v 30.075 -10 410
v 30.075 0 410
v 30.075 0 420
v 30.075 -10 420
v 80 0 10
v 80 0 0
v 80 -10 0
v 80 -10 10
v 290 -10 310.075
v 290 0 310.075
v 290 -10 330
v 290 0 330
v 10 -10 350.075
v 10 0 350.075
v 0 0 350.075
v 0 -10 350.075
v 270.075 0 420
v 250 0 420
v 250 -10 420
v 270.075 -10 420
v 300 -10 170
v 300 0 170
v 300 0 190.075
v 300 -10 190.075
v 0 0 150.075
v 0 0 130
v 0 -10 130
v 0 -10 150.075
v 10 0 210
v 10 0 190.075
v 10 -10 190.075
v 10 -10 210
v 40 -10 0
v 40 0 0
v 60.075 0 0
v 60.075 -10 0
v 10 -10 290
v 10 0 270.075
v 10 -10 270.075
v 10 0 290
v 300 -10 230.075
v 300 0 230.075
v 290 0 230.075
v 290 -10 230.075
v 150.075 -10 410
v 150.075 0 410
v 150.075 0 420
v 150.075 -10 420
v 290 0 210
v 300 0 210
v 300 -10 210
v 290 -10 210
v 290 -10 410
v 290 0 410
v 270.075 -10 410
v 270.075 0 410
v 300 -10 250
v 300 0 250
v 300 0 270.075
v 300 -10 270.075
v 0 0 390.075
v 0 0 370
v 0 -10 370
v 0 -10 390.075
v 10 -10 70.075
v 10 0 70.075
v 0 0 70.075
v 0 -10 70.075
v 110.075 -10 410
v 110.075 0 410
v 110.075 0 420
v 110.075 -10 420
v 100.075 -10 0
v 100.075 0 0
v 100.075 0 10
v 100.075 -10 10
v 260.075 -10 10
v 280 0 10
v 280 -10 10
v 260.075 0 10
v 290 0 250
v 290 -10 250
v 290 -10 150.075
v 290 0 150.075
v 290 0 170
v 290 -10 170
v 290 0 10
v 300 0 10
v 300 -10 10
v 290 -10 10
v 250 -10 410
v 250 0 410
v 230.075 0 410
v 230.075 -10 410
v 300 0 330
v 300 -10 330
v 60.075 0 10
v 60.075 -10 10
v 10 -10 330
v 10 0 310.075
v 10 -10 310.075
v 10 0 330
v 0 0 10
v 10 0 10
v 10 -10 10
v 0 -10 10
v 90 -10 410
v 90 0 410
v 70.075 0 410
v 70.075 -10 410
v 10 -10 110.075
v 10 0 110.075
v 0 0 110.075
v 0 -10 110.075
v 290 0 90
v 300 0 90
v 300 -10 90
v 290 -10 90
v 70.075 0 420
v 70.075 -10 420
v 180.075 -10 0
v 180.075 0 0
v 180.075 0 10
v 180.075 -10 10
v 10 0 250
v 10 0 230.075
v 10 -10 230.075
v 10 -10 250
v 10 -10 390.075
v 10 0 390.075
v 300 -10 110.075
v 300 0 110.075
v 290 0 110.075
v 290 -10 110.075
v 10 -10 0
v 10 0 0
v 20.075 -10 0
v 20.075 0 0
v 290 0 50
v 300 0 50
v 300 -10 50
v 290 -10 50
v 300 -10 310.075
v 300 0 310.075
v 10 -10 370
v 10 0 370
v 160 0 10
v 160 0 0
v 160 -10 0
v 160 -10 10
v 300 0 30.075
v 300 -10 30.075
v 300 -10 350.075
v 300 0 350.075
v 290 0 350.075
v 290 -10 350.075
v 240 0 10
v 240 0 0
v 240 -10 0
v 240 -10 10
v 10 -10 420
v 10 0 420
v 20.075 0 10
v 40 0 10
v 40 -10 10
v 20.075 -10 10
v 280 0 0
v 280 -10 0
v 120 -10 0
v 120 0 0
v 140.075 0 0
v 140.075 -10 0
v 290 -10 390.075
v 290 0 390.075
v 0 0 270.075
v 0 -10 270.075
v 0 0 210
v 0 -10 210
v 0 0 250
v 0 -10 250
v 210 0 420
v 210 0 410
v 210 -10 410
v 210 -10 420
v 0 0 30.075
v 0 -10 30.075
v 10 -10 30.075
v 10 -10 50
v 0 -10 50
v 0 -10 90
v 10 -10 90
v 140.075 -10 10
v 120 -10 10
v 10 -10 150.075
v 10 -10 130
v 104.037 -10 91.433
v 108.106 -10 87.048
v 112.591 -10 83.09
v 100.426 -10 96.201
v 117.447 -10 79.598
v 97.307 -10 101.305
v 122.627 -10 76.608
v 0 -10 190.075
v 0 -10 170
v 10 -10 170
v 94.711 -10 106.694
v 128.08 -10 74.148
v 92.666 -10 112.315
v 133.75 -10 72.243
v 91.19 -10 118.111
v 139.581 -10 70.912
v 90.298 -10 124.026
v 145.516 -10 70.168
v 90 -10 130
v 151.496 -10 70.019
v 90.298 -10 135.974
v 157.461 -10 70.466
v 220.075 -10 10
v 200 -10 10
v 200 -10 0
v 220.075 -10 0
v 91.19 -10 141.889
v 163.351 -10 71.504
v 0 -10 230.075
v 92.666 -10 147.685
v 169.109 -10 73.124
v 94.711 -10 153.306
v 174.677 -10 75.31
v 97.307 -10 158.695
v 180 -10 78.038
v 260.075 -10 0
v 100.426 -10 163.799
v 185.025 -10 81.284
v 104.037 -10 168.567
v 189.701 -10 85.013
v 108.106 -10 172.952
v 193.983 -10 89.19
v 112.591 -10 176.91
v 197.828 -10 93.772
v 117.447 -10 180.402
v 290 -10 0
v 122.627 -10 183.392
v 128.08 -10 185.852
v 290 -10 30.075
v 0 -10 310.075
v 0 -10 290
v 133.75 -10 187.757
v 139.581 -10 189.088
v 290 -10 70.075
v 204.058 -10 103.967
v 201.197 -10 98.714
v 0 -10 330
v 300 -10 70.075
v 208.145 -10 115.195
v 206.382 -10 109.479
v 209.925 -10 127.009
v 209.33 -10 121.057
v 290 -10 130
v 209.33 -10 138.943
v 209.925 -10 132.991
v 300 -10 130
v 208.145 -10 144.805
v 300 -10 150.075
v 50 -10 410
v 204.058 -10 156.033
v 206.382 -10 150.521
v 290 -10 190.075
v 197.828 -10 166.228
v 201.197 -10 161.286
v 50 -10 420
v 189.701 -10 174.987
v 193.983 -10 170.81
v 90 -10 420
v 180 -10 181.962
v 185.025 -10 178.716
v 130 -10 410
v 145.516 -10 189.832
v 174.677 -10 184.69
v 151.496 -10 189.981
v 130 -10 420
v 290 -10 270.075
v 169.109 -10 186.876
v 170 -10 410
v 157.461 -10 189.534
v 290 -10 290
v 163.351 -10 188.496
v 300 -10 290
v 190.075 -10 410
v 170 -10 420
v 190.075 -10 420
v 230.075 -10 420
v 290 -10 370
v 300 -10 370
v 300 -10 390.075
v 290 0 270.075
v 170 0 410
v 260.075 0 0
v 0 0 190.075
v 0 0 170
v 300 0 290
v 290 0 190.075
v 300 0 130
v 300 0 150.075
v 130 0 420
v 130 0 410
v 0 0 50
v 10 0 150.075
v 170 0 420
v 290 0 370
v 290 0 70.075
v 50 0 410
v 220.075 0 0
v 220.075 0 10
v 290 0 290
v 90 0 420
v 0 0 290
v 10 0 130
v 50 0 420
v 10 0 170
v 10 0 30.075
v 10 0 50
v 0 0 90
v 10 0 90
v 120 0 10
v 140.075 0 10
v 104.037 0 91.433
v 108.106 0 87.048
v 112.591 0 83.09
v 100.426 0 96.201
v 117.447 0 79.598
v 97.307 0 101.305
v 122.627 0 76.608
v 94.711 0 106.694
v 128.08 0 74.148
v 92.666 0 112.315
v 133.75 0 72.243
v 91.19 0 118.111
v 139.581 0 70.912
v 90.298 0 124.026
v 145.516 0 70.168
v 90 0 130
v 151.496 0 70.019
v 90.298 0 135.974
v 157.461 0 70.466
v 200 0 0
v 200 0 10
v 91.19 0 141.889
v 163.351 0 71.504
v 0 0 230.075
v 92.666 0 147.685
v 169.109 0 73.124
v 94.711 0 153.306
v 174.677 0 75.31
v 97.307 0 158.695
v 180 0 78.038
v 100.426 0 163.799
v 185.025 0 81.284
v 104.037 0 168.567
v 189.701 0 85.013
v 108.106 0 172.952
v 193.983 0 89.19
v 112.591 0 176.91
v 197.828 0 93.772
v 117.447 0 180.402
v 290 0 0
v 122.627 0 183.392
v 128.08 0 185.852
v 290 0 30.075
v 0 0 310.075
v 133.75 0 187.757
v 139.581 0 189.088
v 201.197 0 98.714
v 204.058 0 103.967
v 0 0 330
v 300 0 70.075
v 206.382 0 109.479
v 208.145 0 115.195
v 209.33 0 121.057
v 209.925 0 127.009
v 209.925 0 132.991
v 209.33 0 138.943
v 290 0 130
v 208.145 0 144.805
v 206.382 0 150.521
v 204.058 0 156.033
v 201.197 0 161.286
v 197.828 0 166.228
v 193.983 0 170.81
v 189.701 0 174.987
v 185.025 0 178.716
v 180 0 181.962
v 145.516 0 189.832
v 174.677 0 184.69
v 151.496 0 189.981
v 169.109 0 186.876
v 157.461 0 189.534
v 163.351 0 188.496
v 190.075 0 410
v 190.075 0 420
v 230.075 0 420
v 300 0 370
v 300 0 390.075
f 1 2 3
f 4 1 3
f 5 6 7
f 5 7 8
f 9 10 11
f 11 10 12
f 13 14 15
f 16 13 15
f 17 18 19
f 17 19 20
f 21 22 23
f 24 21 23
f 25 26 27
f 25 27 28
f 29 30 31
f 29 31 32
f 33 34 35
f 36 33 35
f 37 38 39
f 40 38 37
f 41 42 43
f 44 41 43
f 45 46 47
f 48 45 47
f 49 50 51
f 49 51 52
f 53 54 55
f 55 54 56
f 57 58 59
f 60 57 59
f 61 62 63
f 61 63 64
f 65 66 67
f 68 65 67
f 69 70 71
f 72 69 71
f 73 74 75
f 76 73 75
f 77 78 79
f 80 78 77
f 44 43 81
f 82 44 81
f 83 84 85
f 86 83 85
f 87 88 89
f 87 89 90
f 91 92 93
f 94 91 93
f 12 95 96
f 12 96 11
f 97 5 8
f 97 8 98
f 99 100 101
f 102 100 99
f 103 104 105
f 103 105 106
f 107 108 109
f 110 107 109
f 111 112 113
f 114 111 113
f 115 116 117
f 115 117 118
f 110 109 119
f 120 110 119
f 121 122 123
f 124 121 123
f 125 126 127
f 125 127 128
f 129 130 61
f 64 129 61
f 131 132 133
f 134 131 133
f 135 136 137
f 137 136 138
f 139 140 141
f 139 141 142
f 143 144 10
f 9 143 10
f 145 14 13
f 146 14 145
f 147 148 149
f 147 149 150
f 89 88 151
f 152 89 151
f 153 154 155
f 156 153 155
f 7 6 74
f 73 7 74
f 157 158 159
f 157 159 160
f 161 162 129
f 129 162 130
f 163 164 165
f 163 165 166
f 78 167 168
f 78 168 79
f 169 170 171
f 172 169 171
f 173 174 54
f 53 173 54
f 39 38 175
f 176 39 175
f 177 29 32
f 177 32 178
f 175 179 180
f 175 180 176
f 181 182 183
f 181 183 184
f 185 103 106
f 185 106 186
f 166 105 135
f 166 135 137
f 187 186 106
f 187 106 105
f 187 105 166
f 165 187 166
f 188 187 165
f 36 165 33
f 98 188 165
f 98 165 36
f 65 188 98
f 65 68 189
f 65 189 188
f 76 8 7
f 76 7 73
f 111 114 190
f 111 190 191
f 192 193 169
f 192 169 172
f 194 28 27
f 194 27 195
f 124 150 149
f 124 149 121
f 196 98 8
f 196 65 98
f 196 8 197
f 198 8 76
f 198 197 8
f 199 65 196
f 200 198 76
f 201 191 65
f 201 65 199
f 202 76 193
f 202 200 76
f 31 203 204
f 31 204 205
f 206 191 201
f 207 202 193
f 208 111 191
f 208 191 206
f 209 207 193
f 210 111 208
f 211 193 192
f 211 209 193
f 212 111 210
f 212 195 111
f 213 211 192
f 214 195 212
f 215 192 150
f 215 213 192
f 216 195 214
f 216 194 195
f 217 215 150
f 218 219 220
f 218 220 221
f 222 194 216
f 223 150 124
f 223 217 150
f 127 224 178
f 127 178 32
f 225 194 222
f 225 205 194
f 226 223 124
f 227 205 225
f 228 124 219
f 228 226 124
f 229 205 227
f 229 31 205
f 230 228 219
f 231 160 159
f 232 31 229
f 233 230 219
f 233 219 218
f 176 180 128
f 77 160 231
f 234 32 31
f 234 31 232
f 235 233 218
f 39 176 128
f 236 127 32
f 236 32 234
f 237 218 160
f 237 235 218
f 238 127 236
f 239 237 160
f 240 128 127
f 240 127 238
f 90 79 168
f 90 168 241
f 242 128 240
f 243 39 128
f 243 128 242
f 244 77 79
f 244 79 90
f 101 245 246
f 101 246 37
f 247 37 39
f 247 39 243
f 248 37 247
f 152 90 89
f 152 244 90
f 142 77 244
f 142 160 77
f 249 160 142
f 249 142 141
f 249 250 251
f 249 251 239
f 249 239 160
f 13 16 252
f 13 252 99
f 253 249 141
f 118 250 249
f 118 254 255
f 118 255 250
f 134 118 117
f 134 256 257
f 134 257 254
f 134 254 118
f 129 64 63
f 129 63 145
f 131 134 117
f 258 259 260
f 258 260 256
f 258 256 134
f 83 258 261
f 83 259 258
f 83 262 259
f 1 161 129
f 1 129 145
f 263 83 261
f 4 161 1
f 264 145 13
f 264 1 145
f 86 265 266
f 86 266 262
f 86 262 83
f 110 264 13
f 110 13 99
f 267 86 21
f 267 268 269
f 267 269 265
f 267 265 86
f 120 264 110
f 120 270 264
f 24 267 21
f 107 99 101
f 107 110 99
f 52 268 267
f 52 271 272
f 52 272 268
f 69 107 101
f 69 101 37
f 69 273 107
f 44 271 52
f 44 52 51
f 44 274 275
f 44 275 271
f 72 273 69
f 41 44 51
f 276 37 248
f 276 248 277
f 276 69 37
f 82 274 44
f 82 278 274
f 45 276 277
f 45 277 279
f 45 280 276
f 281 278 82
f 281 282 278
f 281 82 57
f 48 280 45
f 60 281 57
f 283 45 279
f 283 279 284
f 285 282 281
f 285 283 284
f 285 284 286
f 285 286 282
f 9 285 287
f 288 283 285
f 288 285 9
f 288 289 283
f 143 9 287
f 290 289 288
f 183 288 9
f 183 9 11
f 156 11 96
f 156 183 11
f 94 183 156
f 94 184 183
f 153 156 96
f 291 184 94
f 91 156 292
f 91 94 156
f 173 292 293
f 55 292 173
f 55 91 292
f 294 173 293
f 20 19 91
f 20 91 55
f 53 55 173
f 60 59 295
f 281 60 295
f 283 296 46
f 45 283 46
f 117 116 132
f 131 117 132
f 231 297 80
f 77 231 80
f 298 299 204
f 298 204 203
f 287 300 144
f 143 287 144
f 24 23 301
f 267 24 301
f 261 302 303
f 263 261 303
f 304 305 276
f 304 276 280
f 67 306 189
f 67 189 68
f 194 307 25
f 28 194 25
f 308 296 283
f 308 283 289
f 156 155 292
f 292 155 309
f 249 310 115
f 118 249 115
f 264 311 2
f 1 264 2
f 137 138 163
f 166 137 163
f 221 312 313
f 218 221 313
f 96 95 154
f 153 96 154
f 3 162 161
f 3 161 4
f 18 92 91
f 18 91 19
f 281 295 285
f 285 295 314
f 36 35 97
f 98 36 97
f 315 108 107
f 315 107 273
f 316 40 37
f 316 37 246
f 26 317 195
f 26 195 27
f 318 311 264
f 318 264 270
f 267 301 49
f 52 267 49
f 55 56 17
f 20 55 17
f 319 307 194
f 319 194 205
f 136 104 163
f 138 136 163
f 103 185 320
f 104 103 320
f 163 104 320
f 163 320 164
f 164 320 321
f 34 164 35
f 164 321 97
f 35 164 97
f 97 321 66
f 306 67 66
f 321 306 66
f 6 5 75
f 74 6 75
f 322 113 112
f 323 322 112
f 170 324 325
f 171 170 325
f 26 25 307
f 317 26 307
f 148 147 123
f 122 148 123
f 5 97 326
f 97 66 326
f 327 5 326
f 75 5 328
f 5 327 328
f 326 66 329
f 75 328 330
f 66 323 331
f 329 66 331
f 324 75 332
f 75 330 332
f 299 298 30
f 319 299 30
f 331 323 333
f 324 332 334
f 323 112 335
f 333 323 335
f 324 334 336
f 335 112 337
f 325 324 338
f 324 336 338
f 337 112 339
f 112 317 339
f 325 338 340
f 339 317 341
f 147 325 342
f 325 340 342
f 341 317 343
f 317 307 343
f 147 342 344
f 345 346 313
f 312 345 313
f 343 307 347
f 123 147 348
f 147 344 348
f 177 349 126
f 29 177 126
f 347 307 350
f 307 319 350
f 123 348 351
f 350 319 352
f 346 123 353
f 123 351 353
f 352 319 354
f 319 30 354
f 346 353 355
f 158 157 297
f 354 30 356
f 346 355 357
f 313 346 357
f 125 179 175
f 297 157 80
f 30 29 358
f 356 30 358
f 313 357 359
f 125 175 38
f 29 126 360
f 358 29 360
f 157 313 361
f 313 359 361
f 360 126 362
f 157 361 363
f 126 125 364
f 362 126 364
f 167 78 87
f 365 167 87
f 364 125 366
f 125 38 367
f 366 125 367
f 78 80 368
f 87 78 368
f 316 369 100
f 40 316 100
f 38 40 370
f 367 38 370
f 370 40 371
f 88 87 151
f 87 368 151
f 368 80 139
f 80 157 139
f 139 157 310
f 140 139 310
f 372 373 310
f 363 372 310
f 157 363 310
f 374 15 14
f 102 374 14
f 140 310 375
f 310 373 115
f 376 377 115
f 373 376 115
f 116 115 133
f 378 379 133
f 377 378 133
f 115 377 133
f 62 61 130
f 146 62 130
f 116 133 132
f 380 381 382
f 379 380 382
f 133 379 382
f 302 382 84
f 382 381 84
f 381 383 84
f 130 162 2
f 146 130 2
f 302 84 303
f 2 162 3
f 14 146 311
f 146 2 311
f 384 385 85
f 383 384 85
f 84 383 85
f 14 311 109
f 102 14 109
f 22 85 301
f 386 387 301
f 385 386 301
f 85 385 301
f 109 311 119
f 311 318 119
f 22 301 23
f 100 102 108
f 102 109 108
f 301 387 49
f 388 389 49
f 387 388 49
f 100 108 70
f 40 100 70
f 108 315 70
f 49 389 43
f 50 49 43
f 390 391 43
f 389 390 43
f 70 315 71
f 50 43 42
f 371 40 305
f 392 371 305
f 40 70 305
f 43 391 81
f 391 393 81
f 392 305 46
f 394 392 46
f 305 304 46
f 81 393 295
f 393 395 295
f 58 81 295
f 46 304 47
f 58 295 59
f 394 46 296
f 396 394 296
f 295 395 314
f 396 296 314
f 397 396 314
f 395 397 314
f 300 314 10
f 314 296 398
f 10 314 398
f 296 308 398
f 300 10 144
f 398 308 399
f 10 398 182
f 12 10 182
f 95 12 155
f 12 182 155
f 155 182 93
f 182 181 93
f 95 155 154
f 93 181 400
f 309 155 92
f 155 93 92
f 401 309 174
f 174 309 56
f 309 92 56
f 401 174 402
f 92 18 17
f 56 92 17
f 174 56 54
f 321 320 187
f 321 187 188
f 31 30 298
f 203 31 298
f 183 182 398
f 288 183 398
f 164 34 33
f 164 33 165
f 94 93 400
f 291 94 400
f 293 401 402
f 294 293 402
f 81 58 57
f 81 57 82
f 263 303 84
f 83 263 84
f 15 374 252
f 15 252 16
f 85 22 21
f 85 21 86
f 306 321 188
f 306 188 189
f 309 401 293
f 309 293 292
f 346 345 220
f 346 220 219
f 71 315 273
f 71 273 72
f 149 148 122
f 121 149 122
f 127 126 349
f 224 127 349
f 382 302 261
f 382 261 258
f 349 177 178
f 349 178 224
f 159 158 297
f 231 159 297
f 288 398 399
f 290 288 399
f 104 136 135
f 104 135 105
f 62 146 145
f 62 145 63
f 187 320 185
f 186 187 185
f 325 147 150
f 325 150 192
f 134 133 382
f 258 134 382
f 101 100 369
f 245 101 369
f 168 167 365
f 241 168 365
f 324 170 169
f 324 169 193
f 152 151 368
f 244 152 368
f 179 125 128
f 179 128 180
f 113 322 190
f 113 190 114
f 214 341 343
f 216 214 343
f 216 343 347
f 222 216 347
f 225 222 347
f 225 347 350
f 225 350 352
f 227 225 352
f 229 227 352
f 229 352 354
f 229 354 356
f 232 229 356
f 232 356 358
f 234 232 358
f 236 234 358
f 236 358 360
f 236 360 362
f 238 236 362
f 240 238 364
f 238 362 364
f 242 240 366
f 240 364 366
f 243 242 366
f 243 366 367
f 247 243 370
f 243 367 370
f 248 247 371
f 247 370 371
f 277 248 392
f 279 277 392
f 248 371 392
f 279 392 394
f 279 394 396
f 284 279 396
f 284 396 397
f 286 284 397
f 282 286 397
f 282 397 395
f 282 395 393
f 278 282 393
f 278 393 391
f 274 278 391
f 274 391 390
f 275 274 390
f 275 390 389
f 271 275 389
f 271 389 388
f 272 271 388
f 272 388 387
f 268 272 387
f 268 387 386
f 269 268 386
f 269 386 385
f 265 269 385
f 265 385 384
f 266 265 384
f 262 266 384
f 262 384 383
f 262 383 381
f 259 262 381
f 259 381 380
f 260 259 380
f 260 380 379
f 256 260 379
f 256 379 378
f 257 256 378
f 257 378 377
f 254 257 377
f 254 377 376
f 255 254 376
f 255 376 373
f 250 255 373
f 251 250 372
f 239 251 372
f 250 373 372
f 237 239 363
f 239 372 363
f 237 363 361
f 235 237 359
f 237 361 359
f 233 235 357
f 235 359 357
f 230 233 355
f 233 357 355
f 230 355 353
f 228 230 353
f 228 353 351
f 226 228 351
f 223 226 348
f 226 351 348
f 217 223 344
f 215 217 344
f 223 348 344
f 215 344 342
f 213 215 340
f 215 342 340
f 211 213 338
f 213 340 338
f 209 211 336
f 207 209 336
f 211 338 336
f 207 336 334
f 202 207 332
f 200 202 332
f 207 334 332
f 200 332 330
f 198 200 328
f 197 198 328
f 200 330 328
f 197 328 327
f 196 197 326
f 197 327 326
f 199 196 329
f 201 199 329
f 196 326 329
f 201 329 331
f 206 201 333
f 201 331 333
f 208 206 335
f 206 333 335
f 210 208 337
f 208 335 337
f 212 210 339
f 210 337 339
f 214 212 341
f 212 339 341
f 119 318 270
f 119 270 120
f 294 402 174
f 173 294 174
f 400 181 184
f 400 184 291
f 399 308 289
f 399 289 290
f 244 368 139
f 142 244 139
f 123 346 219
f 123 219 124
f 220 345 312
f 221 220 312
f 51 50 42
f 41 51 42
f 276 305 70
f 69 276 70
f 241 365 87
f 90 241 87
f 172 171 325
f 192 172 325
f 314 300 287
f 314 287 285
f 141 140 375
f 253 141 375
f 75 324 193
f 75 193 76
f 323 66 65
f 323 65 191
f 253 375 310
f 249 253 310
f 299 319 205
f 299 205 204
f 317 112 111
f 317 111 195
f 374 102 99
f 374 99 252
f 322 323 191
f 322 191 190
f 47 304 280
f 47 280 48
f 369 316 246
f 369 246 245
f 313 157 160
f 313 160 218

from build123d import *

# Parameters (mm, degrees)
F0_W     = 300
F0_H     = 420
F1_DEPTH = 10
F2_W     = 10
F2_H     = 10
F2_W_2   = 19.925
F2_H_2   = 19.925
F3_DEPTH = 10.001
F4_R     = 60
F5_DEPTH = 10.001


with BuildPart() as f1:
    # F0 (on Front) → F1 (new body)
    with BuildSketch(Plane.XZ):
        with Locations((150, 210)):
            Rectangle(F0_W, F0_H)
    extrude(amount=F1_DEPTH)

    # F2 (on face) → F3 (cut, through all)
    with BuildSketch(Plane(origin=(0, 0, 0), x_dir=(-1, 0, 0), z_dir=(0, 1, 0))):
        with Locations((-295, 5)):
            Rectangle(F2_W, F2_H)
        with Locations((-270.0375, 5)):
            Rectangle(F2_W_2, F2_H)
        with Locations((-230.0375, 5)):
            Rectangle(F2_W_2, F2_H)
        with Locations((-190.0375, 5)):
            Rectangle(F2_W_2, F2_H)
        with Locations((-150.0375, 5)):
            Rectangle(F2_W_2, F2_H)
        with Locations((-110.0375, 5)):
            Rectangle(F2_W_2, F2_H)
        with Locations((-70.0375, 5)):
            Rectangle(F2_W_2, F2_H)
        with Locations((-30.0375, 5)):
            Rectangle(F2_W_2, F2_H)
        with Locations((-5, 5)):
            Rectangle(F2_W, F2_H)
        with Locations((-295, 40.0375)):
            Rectangle(F2_W, F2_H_2)
        with Locations((-295, 80.0375)):
            Rectangle(F2_W, F2_H_2)
        with Locations((-295, 120.0375)):
            Rectangle(F2_W, F2_H_2)
        with Locations((-295, 160.0375)):
            Rectangle(F2_W, F2_H_2)
        with Locations((-295, 200.0375)):
            Rectangle(F2_W, F2_H_2)
        with Locations((-295, 240.0375)):
            Rectangle(F2_W, F2_H_2)
        with Locations((-295, 280.0375)):
            Rectangle(F2_W, F2_H_2)
        with Locations((-295, 320.0375)):
            Rectangle(F2_W, F2_H_2)
        with Locations((-295, 360.0375)):
            Rectangle(F2_W, F2_H_2)
        with Locations((-295, 400.0375)):
            Rectangle(F2_W, F2_H_2)
        with Locations((-295, 415)):
            Rectangle(F2_W, F2_H)
        with Locations((-280.0375, 415)):
            Rectangle(F2_W_2, F2_H)
        with Locations((-240.0375, 415)):
            Rectangle(F2_W_2, F2_H)
        with Locations((-200.0375, 415)):
            Rectangle(F2_W_2, F2_H)
        with Locations((-160.0375, 415)):
            Rectangle(F2_W_2, F2_H)
        with Locations((-120.0375, 415)):
            Rectangle(F2_W_2, F2_H)
        with Locations((-80.0375, 415)):
            Rectangle(F2_W_2, F2_H)
        with Locations((-40.0375, 415)):
            Rectangle(F2_W_2, F2_H)
        Polygon((9.925, 420), (-10, 420), (-10, 410), (0, 410), (9.925, 410), align=None)
        with Locations((-5, 400.0375)):
            Rectangle(F2_W, F2_H_2)
        with Locations((-5, 360.0375)):
            Rectangle(F2_W, F2_H_2)
        with Locations((-5, 320.0375)):
            Rectangle(F2_W, F2_H_2)
        with Locations((-5, 280.0375)):
            Rectangle(F2_W, F2_H_2)
        with Locations((-5, 240.0375)):
            Rectangle(F2_W, F2_H_2)
        with Locations((-5, 200.0375)):
            Rectangle(F2_W, F2_H_2)
        with Locations((-5, 160.0375)):
            Rectangle(F2_W, F2_H_2)
        with Locations((-5, 120.0375)):
            Rectangle(F2_W, F2_H_2)
        with Locations((-5, 80.0375)):
            Rectangle(F2_W, F2_H_2)
        with Locations((-5, 40.0375)):
            Rectangle(F2_W, F2_H_2)
    extrude(amount=-F3_DEPTH, mode=Mode.SUBTRACT)

    # F4 (on face) → F5 (cut, through all)
    with BuildSketch(Plane(origin=(0, 0, 0), x_dir=(-1, 0, 0), z_dir=(0, 1, 0))):
        with Locations((-150, 130)):
            Circle(F4_R)
    extrude(amount=-F5_DEPTH, mode=Mode.SUBTRACT)


solid = f1.part
